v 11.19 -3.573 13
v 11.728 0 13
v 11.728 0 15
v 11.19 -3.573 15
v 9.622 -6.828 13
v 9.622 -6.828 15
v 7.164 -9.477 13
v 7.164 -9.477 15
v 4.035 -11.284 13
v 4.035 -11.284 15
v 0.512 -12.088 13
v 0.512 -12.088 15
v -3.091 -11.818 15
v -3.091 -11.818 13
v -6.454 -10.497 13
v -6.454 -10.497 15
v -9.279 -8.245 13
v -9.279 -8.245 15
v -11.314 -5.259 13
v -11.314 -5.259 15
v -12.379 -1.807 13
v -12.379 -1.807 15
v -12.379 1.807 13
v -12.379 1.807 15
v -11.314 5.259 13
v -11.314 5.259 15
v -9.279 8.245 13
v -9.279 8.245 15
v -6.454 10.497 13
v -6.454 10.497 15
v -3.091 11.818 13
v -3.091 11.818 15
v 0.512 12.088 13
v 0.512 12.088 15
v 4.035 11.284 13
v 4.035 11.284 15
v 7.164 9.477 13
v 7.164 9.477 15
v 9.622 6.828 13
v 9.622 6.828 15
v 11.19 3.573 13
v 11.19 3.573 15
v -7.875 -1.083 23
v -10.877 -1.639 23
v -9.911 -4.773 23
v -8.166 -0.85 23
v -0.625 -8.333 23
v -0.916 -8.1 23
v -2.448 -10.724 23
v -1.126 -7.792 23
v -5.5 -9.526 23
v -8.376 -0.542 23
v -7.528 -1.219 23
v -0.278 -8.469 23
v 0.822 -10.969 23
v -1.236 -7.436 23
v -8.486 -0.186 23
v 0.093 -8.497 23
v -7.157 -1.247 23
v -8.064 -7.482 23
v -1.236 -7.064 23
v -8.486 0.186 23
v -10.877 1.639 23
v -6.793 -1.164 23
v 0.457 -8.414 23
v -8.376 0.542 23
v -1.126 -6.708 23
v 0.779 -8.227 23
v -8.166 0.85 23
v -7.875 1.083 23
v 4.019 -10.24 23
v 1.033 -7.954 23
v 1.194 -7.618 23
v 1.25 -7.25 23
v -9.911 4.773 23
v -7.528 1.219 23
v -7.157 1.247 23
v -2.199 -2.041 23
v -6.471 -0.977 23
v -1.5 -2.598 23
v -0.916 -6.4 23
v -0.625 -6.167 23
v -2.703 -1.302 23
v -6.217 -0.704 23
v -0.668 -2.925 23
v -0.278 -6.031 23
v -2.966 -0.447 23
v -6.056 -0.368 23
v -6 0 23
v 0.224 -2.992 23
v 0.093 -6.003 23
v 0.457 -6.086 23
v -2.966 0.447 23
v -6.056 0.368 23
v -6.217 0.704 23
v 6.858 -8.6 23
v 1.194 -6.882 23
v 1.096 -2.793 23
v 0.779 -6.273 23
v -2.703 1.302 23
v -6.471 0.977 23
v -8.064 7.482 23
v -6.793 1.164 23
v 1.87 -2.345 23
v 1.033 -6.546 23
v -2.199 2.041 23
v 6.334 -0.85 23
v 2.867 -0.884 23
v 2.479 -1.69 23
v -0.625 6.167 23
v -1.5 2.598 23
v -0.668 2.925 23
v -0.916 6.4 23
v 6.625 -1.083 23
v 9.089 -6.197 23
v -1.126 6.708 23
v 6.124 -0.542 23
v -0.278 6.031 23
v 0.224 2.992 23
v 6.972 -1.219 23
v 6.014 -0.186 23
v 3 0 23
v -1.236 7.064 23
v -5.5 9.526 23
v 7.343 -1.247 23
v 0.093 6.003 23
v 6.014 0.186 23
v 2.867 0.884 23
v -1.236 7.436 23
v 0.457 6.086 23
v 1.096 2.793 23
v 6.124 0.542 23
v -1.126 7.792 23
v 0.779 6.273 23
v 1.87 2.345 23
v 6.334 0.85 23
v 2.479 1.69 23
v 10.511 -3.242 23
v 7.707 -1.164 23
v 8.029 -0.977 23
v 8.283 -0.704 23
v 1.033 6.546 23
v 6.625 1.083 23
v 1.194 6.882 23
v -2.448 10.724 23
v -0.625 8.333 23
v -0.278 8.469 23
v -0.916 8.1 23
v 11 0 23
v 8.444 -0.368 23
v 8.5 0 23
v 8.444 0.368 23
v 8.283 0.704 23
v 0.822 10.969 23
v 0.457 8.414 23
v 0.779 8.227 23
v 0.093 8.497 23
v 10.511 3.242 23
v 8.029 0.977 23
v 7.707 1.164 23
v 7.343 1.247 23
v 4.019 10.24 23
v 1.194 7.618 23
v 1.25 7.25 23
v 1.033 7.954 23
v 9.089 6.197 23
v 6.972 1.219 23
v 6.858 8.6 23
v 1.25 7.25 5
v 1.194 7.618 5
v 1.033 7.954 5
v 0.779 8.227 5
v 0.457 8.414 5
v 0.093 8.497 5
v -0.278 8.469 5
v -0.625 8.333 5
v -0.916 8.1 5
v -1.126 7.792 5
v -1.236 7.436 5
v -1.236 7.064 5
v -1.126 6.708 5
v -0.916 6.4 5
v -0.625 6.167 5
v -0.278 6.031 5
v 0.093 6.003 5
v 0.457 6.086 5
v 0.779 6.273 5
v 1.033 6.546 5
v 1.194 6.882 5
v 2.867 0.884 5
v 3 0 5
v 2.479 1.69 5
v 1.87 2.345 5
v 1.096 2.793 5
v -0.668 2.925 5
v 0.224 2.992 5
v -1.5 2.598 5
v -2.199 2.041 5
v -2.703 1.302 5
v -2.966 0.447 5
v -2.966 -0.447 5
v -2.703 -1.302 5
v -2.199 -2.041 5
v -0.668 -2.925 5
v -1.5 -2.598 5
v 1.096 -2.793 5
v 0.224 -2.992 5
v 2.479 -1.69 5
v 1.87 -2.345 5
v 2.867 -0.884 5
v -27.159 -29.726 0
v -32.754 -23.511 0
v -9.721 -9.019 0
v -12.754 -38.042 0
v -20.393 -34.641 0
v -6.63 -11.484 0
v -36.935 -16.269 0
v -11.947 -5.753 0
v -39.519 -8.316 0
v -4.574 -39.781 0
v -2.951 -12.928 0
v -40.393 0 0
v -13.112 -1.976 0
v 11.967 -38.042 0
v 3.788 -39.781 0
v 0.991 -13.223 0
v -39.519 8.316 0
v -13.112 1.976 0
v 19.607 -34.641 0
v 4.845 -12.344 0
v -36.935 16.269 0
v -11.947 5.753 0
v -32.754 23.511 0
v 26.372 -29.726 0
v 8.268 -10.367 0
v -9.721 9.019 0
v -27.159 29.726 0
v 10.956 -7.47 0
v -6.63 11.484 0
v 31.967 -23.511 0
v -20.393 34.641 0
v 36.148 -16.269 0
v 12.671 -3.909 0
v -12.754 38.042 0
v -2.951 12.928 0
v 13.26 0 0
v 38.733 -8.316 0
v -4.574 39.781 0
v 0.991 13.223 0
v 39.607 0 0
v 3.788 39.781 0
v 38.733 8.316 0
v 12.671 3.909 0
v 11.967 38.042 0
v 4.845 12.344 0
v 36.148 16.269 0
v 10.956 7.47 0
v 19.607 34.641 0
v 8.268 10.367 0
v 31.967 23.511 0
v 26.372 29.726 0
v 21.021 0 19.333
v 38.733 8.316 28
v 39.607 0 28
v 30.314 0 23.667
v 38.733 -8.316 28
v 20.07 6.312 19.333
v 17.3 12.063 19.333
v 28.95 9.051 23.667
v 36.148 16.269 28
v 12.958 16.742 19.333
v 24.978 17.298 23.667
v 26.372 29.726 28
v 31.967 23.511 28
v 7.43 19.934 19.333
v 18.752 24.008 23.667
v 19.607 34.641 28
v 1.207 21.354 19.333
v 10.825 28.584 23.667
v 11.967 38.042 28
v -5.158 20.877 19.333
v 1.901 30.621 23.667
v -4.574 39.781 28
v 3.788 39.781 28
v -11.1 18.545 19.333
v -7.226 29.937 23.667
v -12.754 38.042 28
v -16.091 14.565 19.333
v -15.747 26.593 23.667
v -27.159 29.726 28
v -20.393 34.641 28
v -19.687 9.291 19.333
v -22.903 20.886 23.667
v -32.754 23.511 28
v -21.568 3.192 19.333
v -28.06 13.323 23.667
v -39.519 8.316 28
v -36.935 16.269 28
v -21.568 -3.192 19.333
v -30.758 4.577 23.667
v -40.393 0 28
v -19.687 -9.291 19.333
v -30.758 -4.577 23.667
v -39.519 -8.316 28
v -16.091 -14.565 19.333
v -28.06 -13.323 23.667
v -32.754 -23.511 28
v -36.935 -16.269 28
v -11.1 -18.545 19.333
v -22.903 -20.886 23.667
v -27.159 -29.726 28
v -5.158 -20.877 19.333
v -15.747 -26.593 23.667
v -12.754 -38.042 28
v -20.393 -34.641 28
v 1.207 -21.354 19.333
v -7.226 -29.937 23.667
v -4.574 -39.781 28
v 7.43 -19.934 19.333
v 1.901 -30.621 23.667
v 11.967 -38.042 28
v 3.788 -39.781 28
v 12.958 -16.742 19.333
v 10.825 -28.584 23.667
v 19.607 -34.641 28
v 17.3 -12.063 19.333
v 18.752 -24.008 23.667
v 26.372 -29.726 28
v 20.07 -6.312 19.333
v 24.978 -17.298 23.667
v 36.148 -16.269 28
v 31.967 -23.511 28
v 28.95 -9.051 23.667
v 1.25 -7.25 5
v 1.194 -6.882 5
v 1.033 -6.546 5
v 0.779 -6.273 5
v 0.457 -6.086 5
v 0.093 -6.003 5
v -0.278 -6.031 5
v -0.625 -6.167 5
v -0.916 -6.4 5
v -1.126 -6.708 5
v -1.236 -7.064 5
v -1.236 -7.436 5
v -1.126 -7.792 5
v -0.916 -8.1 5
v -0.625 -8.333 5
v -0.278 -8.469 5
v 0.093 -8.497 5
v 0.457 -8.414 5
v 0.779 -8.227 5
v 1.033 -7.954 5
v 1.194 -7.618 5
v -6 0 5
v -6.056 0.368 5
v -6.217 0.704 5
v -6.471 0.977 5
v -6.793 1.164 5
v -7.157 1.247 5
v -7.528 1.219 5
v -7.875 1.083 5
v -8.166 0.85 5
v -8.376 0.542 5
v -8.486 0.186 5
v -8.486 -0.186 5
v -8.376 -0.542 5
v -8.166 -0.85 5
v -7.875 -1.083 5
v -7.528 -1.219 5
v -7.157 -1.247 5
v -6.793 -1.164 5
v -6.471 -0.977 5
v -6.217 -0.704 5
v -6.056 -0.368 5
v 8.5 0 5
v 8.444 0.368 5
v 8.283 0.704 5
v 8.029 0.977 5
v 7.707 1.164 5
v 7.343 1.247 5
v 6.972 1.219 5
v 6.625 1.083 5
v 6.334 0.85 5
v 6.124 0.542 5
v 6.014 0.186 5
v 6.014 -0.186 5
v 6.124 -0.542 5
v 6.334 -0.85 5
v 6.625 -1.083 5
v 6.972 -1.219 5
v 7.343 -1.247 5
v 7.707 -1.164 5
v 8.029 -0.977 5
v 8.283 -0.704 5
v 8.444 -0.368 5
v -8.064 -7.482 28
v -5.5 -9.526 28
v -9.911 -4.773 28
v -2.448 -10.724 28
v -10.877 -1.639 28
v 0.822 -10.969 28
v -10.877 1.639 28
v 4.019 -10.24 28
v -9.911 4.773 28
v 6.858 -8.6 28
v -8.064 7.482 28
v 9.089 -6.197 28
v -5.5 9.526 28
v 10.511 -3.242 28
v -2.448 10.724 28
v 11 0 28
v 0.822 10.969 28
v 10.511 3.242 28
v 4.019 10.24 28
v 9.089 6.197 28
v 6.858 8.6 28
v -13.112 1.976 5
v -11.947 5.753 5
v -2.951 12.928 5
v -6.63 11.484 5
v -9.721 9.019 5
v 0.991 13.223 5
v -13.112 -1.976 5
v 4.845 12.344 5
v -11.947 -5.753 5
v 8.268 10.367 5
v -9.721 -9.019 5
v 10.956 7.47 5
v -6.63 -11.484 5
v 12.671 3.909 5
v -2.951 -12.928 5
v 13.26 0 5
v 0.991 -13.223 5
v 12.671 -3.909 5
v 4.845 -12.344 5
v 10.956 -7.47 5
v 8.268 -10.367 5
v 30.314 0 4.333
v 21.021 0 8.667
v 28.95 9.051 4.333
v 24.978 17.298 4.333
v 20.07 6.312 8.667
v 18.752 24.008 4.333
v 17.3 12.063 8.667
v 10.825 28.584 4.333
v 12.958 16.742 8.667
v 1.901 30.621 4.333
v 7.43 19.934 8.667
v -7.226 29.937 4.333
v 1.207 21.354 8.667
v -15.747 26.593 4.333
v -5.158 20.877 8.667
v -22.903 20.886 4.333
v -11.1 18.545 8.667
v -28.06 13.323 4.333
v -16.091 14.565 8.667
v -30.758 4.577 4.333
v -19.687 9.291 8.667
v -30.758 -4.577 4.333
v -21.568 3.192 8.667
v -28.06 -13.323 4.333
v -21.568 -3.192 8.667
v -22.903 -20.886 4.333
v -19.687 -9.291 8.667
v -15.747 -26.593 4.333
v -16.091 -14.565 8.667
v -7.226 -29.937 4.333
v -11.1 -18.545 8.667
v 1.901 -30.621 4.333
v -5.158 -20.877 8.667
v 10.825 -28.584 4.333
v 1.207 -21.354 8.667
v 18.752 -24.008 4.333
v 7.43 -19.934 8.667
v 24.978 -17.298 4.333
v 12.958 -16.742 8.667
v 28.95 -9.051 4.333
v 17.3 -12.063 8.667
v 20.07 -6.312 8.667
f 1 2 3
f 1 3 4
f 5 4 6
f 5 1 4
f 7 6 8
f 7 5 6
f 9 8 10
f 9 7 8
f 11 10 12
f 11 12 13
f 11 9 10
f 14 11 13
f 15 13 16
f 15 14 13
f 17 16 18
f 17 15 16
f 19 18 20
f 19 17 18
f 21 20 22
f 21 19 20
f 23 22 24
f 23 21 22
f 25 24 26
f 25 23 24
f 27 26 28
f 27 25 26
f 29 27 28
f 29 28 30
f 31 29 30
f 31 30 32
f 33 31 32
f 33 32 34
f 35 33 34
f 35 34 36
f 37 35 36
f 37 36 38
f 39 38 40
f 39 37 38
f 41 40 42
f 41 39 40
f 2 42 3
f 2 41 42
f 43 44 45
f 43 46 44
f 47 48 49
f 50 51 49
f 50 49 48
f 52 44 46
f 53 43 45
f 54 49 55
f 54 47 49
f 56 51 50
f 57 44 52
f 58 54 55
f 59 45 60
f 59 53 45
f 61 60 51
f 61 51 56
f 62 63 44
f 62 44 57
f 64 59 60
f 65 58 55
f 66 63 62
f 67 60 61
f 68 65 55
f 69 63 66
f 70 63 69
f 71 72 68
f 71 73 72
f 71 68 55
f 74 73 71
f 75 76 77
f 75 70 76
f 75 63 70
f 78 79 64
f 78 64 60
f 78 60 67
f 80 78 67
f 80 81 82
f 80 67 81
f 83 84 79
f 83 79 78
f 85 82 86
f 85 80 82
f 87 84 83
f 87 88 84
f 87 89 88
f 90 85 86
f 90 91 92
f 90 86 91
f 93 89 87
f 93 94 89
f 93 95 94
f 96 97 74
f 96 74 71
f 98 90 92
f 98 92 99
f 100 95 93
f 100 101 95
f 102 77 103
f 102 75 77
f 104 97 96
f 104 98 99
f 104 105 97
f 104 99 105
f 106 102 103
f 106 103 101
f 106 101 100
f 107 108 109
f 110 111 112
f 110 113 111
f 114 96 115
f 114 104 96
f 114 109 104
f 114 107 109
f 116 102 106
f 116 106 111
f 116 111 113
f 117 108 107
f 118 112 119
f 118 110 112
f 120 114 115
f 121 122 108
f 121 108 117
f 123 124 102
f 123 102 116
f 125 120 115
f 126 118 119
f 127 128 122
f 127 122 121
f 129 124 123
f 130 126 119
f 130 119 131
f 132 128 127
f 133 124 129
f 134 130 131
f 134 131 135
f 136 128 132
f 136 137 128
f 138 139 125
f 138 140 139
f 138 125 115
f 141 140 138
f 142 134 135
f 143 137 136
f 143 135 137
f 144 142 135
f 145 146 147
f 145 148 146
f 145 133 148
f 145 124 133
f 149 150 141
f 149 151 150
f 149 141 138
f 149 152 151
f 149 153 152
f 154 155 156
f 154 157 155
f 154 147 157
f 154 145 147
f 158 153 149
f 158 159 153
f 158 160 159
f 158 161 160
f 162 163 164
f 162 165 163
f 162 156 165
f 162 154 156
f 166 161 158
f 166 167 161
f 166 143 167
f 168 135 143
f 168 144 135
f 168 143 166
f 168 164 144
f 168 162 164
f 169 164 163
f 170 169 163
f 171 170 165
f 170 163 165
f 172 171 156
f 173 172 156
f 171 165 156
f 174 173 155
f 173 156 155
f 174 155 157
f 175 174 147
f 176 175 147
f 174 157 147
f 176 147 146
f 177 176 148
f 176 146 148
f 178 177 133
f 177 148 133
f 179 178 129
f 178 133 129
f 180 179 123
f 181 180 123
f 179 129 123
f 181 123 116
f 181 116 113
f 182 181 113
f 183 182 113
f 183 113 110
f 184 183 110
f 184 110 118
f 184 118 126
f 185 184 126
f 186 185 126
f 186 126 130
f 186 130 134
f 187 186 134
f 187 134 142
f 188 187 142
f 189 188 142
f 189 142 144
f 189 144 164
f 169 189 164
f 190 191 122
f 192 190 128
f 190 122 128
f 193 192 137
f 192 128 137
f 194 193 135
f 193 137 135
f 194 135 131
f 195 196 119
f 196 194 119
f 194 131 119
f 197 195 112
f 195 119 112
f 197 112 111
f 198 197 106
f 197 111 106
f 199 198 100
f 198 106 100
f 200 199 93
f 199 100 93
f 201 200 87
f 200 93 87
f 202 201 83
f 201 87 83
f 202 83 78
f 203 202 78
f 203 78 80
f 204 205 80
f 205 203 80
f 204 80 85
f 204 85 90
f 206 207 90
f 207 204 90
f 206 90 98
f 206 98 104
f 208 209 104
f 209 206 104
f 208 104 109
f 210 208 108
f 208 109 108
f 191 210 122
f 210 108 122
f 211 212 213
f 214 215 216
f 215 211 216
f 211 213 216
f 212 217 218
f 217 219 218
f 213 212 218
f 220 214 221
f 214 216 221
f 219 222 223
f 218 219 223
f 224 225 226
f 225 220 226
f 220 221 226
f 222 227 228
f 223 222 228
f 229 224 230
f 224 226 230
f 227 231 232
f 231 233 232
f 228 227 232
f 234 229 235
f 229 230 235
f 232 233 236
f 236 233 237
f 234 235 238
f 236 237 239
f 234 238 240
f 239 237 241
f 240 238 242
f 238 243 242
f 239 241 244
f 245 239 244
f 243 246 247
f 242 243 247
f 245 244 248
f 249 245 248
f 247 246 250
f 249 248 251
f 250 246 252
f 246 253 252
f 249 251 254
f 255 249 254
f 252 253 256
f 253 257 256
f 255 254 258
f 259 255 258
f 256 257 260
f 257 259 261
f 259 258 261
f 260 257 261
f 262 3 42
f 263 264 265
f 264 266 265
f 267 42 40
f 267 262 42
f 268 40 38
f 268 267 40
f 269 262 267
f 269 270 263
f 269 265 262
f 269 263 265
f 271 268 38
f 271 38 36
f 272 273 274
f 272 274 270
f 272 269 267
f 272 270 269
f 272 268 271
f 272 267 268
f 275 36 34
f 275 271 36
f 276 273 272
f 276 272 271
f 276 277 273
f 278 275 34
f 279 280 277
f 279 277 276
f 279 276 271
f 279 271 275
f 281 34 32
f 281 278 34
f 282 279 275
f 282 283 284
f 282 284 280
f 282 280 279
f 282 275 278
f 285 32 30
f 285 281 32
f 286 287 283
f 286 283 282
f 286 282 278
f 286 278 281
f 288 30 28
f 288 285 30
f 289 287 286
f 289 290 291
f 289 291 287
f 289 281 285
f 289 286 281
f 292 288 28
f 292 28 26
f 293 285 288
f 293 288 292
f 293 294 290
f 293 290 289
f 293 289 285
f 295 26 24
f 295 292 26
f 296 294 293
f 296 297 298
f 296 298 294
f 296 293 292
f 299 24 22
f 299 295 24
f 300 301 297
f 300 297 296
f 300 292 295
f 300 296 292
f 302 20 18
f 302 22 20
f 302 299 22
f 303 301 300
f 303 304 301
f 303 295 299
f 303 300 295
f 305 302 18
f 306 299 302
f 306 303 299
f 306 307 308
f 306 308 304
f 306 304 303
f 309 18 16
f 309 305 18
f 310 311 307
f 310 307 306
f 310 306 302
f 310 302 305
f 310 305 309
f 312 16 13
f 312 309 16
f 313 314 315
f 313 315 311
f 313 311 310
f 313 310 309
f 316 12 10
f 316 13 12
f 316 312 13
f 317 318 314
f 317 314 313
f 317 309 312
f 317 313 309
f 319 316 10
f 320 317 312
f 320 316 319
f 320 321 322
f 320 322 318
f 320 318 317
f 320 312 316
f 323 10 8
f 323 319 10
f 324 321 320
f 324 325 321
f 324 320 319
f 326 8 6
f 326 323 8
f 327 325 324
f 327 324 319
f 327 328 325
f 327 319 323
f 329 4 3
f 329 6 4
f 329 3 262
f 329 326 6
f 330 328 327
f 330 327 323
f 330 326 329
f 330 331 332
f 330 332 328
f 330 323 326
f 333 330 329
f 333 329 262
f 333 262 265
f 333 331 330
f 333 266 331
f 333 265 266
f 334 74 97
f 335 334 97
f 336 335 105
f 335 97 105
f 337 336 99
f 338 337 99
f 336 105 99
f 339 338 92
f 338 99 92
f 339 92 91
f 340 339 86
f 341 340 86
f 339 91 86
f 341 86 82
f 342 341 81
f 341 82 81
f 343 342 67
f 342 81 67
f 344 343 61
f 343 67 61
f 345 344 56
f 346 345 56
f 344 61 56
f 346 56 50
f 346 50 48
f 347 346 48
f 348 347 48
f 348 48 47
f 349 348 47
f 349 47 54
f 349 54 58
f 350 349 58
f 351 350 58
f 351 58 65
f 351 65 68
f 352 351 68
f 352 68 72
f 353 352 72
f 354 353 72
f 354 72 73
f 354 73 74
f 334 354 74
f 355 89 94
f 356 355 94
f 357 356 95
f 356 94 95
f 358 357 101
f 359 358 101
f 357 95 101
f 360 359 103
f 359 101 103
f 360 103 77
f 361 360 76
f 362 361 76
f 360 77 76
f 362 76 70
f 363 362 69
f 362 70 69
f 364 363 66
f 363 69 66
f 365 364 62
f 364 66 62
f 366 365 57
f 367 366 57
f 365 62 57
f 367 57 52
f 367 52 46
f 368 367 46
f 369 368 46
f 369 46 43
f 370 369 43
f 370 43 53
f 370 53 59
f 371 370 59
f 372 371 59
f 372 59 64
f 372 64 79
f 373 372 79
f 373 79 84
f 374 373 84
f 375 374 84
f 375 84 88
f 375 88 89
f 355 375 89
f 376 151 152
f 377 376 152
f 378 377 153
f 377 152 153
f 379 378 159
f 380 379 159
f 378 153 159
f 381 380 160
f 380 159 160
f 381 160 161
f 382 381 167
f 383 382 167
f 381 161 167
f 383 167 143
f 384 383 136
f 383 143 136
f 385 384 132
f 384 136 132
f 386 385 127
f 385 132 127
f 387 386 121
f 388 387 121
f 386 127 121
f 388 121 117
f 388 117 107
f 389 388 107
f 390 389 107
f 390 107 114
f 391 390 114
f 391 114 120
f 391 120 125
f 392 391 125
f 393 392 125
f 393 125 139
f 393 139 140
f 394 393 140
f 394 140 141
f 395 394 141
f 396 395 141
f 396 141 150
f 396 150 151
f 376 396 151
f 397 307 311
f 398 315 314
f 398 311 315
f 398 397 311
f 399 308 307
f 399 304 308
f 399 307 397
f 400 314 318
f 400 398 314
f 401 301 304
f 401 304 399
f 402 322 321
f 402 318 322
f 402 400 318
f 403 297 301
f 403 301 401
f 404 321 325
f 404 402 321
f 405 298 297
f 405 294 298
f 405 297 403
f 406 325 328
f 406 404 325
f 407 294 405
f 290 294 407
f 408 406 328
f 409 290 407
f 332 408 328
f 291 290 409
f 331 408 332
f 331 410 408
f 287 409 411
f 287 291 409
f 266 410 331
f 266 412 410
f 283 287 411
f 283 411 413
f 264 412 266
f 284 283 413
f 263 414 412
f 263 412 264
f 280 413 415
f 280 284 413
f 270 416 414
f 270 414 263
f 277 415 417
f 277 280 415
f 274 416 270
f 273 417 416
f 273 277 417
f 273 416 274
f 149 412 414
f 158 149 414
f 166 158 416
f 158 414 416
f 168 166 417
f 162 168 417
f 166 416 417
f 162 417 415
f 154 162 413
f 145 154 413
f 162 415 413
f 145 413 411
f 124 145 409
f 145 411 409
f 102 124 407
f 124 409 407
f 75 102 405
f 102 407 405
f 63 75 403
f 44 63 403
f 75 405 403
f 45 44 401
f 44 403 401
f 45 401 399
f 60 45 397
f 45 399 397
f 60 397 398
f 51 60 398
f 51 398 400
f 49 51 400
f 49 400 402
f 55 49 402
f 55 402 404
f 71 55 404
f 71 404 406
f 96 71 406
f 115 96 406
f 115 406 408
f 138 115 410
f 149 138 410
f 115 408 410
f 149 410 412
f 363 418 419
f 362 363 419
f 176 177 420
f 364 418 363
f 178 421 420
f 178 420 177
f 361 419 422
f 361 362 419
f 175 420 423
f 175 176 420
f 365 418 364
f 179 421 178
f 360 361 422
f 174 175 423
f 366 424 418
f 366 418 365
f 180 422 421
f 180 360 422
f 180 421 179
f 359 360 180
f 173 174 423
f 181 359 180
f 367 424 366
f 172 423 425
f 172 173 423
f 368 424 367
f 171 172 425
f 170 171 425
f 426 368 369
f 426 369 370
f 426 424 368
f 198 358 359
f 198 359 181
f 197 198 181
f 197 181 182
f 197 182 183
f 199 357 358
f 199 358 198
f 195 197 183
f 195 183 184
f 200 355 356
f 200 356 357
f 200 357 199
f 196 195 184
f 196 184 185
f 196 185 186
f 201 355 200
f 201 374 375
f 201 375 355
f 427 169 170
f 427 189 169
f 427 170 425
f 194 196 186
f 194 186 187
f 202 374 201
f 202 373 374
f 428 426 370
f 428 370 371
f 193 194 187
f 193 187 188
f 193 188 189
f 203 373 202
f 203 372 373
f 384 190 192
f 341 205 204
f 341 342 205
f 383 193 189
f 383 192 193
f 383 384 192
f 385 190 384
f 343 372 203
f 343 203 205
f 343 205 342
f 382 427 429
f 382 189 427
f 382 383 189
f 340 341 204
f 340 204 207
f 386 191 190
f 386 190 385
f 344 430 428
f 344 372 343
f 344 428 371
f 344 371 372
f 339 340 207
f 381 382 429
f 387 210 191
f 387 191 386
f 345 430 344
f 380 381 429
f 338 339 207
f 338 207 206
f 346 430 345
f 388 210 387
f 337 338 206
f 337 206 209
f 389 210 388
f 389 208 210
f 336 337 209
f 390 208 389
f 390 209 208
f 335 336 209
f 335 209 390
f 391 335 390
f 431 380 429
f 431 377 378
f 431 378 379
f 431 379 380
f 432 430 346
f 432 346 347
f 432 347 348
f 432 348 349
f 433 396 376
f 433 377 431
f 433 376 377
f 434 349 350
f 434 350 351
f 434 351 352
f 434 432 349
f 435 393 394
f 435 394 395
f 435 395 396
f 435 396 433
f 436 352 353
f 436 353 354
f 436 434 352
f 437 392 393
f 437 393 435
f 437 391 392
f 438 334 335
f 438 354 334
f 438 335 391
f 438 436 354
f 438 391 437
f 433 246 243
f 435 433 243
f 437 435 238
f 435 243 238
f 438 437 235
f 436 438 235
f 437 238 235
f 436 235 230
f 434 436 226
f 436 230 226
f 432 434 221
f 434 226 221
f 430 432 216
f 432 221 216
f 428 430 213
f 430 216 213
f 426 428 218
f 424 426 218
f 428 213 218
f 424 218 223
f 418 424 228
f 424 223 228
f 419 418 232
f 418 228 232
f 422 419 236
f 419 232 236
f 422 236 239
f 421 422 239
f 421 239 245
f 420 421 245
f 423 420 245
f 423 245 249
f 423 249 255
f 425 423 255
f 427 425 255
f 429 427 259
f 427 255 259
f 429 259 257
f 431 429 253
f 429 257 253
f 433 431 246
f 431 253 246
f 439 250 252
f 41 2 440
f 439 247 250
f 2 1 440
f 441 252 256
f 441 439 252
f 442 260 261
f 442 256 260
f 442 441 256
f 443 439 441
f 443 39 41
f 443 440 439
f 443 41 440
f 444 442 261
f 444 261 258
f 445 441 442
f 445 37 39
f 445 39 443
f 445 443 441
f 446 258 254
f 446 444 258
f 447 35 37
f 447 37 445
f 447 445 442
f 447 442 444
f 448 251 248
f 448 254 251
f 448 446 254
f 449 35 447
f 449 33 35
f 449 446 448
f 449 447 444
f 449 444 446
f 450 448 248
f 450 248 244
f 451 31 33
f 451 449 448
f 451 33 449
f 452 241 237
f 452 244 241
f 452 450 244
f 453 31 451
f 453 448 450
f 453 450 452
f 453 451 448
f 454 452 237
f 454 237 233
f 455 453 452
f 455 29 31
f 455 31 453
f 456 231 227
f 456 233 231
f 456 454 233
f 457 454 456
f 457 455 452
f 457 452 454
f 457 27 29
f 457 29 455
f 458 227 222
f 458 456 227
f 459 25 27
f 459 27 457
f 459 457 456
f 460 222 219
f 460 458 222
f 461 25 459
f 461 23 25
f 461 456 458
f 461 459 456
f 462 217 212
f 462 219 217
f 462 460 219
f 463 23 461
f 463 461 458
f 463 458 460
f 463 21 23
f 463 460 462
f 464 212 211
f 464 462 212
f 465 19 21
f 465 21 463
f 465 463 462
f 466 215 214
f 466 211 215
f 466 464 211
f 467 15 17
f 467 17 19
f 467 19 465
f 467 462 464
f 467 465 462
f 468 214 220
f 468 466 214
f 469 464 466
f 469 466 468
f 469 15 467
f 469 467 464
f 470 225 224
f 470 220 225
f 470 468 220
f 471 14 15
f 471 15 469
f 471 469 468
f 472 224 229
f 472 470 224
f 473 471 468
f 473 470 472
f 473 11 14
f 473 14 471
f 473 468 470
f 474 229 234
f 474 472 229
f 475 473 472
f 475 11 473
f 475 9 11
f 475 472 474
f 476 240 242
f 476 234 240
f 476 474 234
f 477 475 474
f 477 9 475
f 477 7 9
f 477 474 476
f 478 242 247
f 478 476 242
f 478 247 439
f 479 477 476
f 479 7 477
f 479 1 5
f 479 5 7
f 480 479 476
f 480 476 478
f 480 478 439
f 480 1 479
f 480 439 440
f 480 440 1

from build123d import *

# Parameters (mm, degrees)
F0_R      = 40
F1_DEPTH  = 13
F1_TAPER  = 65
F2_DEPTH  = 2
F2_FACE_R = 12.1214100334
F3_DEPTH  = 13
F3_TAPER  = -65
F4_R      = 11
F5_DEPTH  = 5
F6_R      = 3
F7_DEPTH  = 50
F6_R_2    = 1.25
F8_DEPTH  = 20
F9_R      = 13.260393294
F9_R_2    = 3
F10_DEPTH = 5


with BuildPart() as f1:
    # F0 (on Top) → F1 (new body)
    with BuildSketch(Plane.XY):
        with Locations((-0.3933568078, 0)):
            Circle(F0_R)
    extrude(amount=F1_DEPTH, taper=F1_TAPER)

    # F2 (add): a face of the model
    f2_faces = [f1.faces().sort_by_distance(p)[0] for p in [
        (-0.3933568078, 0, 13),
    ]]
    extrude(f2_faces, amount=F2_DEPTH)

    # F2_face (on face) → F3 (join)
    with BuildSketch(Plane(origin=(-0.3933568078, 0, 15), x_dir=(1, 0, 0), z_dir=(0, 0, 1))):
        Circle(F2_FACE_R)
    extrude(amount=F3_DEPTH, taper=F3_TAPER)

    # F4 (on face) → F5 (cut)
    with BuildSketch(Plane.XY.offset(28)):
        Circle(F4_R)
    extrude(amount=-F5_DEPTH, mode=Mode.SUBTRACT)

    # F6 (on face) → F7 (cut)
    with BuildSketch(Plane.XY.offset(23)):
        Circle(F6_R)
    extrude(amount=-F7_DEPTH, mode=Mode.SUBTRACT)

    # F6 (on face) → F8 (cut)
    with BuildSketch(Plane.XY.offset(23)):
        with Locations((0, 7.25)):
            Circle(F6_R_2)
        with Locations((7.25, 0)):
            Circle(F6_R_2)
        with Locations((0, -7.25)):
            Circle(F6_R_2)
        with Locations((-7.25, 0)):
            Circle(F6_R_2)
    extrude(amount=-F8_DEPTH, mode=Mode.SUBTRACT)

    # F9 (on face) → F10 (cut)
    with BuildSketch(Plane(origin=(0, 0, 0), x_dir=(1, 0, 0), z_dir=(0, 0, -1))):
        Circle(F9_R)
        Circle(F9_R_2, mode=Mode.SUBTRACT)
    extrude(amount=-F10_DEPTH, mode=Mode.SUBTRACT)


solid = f1.part
